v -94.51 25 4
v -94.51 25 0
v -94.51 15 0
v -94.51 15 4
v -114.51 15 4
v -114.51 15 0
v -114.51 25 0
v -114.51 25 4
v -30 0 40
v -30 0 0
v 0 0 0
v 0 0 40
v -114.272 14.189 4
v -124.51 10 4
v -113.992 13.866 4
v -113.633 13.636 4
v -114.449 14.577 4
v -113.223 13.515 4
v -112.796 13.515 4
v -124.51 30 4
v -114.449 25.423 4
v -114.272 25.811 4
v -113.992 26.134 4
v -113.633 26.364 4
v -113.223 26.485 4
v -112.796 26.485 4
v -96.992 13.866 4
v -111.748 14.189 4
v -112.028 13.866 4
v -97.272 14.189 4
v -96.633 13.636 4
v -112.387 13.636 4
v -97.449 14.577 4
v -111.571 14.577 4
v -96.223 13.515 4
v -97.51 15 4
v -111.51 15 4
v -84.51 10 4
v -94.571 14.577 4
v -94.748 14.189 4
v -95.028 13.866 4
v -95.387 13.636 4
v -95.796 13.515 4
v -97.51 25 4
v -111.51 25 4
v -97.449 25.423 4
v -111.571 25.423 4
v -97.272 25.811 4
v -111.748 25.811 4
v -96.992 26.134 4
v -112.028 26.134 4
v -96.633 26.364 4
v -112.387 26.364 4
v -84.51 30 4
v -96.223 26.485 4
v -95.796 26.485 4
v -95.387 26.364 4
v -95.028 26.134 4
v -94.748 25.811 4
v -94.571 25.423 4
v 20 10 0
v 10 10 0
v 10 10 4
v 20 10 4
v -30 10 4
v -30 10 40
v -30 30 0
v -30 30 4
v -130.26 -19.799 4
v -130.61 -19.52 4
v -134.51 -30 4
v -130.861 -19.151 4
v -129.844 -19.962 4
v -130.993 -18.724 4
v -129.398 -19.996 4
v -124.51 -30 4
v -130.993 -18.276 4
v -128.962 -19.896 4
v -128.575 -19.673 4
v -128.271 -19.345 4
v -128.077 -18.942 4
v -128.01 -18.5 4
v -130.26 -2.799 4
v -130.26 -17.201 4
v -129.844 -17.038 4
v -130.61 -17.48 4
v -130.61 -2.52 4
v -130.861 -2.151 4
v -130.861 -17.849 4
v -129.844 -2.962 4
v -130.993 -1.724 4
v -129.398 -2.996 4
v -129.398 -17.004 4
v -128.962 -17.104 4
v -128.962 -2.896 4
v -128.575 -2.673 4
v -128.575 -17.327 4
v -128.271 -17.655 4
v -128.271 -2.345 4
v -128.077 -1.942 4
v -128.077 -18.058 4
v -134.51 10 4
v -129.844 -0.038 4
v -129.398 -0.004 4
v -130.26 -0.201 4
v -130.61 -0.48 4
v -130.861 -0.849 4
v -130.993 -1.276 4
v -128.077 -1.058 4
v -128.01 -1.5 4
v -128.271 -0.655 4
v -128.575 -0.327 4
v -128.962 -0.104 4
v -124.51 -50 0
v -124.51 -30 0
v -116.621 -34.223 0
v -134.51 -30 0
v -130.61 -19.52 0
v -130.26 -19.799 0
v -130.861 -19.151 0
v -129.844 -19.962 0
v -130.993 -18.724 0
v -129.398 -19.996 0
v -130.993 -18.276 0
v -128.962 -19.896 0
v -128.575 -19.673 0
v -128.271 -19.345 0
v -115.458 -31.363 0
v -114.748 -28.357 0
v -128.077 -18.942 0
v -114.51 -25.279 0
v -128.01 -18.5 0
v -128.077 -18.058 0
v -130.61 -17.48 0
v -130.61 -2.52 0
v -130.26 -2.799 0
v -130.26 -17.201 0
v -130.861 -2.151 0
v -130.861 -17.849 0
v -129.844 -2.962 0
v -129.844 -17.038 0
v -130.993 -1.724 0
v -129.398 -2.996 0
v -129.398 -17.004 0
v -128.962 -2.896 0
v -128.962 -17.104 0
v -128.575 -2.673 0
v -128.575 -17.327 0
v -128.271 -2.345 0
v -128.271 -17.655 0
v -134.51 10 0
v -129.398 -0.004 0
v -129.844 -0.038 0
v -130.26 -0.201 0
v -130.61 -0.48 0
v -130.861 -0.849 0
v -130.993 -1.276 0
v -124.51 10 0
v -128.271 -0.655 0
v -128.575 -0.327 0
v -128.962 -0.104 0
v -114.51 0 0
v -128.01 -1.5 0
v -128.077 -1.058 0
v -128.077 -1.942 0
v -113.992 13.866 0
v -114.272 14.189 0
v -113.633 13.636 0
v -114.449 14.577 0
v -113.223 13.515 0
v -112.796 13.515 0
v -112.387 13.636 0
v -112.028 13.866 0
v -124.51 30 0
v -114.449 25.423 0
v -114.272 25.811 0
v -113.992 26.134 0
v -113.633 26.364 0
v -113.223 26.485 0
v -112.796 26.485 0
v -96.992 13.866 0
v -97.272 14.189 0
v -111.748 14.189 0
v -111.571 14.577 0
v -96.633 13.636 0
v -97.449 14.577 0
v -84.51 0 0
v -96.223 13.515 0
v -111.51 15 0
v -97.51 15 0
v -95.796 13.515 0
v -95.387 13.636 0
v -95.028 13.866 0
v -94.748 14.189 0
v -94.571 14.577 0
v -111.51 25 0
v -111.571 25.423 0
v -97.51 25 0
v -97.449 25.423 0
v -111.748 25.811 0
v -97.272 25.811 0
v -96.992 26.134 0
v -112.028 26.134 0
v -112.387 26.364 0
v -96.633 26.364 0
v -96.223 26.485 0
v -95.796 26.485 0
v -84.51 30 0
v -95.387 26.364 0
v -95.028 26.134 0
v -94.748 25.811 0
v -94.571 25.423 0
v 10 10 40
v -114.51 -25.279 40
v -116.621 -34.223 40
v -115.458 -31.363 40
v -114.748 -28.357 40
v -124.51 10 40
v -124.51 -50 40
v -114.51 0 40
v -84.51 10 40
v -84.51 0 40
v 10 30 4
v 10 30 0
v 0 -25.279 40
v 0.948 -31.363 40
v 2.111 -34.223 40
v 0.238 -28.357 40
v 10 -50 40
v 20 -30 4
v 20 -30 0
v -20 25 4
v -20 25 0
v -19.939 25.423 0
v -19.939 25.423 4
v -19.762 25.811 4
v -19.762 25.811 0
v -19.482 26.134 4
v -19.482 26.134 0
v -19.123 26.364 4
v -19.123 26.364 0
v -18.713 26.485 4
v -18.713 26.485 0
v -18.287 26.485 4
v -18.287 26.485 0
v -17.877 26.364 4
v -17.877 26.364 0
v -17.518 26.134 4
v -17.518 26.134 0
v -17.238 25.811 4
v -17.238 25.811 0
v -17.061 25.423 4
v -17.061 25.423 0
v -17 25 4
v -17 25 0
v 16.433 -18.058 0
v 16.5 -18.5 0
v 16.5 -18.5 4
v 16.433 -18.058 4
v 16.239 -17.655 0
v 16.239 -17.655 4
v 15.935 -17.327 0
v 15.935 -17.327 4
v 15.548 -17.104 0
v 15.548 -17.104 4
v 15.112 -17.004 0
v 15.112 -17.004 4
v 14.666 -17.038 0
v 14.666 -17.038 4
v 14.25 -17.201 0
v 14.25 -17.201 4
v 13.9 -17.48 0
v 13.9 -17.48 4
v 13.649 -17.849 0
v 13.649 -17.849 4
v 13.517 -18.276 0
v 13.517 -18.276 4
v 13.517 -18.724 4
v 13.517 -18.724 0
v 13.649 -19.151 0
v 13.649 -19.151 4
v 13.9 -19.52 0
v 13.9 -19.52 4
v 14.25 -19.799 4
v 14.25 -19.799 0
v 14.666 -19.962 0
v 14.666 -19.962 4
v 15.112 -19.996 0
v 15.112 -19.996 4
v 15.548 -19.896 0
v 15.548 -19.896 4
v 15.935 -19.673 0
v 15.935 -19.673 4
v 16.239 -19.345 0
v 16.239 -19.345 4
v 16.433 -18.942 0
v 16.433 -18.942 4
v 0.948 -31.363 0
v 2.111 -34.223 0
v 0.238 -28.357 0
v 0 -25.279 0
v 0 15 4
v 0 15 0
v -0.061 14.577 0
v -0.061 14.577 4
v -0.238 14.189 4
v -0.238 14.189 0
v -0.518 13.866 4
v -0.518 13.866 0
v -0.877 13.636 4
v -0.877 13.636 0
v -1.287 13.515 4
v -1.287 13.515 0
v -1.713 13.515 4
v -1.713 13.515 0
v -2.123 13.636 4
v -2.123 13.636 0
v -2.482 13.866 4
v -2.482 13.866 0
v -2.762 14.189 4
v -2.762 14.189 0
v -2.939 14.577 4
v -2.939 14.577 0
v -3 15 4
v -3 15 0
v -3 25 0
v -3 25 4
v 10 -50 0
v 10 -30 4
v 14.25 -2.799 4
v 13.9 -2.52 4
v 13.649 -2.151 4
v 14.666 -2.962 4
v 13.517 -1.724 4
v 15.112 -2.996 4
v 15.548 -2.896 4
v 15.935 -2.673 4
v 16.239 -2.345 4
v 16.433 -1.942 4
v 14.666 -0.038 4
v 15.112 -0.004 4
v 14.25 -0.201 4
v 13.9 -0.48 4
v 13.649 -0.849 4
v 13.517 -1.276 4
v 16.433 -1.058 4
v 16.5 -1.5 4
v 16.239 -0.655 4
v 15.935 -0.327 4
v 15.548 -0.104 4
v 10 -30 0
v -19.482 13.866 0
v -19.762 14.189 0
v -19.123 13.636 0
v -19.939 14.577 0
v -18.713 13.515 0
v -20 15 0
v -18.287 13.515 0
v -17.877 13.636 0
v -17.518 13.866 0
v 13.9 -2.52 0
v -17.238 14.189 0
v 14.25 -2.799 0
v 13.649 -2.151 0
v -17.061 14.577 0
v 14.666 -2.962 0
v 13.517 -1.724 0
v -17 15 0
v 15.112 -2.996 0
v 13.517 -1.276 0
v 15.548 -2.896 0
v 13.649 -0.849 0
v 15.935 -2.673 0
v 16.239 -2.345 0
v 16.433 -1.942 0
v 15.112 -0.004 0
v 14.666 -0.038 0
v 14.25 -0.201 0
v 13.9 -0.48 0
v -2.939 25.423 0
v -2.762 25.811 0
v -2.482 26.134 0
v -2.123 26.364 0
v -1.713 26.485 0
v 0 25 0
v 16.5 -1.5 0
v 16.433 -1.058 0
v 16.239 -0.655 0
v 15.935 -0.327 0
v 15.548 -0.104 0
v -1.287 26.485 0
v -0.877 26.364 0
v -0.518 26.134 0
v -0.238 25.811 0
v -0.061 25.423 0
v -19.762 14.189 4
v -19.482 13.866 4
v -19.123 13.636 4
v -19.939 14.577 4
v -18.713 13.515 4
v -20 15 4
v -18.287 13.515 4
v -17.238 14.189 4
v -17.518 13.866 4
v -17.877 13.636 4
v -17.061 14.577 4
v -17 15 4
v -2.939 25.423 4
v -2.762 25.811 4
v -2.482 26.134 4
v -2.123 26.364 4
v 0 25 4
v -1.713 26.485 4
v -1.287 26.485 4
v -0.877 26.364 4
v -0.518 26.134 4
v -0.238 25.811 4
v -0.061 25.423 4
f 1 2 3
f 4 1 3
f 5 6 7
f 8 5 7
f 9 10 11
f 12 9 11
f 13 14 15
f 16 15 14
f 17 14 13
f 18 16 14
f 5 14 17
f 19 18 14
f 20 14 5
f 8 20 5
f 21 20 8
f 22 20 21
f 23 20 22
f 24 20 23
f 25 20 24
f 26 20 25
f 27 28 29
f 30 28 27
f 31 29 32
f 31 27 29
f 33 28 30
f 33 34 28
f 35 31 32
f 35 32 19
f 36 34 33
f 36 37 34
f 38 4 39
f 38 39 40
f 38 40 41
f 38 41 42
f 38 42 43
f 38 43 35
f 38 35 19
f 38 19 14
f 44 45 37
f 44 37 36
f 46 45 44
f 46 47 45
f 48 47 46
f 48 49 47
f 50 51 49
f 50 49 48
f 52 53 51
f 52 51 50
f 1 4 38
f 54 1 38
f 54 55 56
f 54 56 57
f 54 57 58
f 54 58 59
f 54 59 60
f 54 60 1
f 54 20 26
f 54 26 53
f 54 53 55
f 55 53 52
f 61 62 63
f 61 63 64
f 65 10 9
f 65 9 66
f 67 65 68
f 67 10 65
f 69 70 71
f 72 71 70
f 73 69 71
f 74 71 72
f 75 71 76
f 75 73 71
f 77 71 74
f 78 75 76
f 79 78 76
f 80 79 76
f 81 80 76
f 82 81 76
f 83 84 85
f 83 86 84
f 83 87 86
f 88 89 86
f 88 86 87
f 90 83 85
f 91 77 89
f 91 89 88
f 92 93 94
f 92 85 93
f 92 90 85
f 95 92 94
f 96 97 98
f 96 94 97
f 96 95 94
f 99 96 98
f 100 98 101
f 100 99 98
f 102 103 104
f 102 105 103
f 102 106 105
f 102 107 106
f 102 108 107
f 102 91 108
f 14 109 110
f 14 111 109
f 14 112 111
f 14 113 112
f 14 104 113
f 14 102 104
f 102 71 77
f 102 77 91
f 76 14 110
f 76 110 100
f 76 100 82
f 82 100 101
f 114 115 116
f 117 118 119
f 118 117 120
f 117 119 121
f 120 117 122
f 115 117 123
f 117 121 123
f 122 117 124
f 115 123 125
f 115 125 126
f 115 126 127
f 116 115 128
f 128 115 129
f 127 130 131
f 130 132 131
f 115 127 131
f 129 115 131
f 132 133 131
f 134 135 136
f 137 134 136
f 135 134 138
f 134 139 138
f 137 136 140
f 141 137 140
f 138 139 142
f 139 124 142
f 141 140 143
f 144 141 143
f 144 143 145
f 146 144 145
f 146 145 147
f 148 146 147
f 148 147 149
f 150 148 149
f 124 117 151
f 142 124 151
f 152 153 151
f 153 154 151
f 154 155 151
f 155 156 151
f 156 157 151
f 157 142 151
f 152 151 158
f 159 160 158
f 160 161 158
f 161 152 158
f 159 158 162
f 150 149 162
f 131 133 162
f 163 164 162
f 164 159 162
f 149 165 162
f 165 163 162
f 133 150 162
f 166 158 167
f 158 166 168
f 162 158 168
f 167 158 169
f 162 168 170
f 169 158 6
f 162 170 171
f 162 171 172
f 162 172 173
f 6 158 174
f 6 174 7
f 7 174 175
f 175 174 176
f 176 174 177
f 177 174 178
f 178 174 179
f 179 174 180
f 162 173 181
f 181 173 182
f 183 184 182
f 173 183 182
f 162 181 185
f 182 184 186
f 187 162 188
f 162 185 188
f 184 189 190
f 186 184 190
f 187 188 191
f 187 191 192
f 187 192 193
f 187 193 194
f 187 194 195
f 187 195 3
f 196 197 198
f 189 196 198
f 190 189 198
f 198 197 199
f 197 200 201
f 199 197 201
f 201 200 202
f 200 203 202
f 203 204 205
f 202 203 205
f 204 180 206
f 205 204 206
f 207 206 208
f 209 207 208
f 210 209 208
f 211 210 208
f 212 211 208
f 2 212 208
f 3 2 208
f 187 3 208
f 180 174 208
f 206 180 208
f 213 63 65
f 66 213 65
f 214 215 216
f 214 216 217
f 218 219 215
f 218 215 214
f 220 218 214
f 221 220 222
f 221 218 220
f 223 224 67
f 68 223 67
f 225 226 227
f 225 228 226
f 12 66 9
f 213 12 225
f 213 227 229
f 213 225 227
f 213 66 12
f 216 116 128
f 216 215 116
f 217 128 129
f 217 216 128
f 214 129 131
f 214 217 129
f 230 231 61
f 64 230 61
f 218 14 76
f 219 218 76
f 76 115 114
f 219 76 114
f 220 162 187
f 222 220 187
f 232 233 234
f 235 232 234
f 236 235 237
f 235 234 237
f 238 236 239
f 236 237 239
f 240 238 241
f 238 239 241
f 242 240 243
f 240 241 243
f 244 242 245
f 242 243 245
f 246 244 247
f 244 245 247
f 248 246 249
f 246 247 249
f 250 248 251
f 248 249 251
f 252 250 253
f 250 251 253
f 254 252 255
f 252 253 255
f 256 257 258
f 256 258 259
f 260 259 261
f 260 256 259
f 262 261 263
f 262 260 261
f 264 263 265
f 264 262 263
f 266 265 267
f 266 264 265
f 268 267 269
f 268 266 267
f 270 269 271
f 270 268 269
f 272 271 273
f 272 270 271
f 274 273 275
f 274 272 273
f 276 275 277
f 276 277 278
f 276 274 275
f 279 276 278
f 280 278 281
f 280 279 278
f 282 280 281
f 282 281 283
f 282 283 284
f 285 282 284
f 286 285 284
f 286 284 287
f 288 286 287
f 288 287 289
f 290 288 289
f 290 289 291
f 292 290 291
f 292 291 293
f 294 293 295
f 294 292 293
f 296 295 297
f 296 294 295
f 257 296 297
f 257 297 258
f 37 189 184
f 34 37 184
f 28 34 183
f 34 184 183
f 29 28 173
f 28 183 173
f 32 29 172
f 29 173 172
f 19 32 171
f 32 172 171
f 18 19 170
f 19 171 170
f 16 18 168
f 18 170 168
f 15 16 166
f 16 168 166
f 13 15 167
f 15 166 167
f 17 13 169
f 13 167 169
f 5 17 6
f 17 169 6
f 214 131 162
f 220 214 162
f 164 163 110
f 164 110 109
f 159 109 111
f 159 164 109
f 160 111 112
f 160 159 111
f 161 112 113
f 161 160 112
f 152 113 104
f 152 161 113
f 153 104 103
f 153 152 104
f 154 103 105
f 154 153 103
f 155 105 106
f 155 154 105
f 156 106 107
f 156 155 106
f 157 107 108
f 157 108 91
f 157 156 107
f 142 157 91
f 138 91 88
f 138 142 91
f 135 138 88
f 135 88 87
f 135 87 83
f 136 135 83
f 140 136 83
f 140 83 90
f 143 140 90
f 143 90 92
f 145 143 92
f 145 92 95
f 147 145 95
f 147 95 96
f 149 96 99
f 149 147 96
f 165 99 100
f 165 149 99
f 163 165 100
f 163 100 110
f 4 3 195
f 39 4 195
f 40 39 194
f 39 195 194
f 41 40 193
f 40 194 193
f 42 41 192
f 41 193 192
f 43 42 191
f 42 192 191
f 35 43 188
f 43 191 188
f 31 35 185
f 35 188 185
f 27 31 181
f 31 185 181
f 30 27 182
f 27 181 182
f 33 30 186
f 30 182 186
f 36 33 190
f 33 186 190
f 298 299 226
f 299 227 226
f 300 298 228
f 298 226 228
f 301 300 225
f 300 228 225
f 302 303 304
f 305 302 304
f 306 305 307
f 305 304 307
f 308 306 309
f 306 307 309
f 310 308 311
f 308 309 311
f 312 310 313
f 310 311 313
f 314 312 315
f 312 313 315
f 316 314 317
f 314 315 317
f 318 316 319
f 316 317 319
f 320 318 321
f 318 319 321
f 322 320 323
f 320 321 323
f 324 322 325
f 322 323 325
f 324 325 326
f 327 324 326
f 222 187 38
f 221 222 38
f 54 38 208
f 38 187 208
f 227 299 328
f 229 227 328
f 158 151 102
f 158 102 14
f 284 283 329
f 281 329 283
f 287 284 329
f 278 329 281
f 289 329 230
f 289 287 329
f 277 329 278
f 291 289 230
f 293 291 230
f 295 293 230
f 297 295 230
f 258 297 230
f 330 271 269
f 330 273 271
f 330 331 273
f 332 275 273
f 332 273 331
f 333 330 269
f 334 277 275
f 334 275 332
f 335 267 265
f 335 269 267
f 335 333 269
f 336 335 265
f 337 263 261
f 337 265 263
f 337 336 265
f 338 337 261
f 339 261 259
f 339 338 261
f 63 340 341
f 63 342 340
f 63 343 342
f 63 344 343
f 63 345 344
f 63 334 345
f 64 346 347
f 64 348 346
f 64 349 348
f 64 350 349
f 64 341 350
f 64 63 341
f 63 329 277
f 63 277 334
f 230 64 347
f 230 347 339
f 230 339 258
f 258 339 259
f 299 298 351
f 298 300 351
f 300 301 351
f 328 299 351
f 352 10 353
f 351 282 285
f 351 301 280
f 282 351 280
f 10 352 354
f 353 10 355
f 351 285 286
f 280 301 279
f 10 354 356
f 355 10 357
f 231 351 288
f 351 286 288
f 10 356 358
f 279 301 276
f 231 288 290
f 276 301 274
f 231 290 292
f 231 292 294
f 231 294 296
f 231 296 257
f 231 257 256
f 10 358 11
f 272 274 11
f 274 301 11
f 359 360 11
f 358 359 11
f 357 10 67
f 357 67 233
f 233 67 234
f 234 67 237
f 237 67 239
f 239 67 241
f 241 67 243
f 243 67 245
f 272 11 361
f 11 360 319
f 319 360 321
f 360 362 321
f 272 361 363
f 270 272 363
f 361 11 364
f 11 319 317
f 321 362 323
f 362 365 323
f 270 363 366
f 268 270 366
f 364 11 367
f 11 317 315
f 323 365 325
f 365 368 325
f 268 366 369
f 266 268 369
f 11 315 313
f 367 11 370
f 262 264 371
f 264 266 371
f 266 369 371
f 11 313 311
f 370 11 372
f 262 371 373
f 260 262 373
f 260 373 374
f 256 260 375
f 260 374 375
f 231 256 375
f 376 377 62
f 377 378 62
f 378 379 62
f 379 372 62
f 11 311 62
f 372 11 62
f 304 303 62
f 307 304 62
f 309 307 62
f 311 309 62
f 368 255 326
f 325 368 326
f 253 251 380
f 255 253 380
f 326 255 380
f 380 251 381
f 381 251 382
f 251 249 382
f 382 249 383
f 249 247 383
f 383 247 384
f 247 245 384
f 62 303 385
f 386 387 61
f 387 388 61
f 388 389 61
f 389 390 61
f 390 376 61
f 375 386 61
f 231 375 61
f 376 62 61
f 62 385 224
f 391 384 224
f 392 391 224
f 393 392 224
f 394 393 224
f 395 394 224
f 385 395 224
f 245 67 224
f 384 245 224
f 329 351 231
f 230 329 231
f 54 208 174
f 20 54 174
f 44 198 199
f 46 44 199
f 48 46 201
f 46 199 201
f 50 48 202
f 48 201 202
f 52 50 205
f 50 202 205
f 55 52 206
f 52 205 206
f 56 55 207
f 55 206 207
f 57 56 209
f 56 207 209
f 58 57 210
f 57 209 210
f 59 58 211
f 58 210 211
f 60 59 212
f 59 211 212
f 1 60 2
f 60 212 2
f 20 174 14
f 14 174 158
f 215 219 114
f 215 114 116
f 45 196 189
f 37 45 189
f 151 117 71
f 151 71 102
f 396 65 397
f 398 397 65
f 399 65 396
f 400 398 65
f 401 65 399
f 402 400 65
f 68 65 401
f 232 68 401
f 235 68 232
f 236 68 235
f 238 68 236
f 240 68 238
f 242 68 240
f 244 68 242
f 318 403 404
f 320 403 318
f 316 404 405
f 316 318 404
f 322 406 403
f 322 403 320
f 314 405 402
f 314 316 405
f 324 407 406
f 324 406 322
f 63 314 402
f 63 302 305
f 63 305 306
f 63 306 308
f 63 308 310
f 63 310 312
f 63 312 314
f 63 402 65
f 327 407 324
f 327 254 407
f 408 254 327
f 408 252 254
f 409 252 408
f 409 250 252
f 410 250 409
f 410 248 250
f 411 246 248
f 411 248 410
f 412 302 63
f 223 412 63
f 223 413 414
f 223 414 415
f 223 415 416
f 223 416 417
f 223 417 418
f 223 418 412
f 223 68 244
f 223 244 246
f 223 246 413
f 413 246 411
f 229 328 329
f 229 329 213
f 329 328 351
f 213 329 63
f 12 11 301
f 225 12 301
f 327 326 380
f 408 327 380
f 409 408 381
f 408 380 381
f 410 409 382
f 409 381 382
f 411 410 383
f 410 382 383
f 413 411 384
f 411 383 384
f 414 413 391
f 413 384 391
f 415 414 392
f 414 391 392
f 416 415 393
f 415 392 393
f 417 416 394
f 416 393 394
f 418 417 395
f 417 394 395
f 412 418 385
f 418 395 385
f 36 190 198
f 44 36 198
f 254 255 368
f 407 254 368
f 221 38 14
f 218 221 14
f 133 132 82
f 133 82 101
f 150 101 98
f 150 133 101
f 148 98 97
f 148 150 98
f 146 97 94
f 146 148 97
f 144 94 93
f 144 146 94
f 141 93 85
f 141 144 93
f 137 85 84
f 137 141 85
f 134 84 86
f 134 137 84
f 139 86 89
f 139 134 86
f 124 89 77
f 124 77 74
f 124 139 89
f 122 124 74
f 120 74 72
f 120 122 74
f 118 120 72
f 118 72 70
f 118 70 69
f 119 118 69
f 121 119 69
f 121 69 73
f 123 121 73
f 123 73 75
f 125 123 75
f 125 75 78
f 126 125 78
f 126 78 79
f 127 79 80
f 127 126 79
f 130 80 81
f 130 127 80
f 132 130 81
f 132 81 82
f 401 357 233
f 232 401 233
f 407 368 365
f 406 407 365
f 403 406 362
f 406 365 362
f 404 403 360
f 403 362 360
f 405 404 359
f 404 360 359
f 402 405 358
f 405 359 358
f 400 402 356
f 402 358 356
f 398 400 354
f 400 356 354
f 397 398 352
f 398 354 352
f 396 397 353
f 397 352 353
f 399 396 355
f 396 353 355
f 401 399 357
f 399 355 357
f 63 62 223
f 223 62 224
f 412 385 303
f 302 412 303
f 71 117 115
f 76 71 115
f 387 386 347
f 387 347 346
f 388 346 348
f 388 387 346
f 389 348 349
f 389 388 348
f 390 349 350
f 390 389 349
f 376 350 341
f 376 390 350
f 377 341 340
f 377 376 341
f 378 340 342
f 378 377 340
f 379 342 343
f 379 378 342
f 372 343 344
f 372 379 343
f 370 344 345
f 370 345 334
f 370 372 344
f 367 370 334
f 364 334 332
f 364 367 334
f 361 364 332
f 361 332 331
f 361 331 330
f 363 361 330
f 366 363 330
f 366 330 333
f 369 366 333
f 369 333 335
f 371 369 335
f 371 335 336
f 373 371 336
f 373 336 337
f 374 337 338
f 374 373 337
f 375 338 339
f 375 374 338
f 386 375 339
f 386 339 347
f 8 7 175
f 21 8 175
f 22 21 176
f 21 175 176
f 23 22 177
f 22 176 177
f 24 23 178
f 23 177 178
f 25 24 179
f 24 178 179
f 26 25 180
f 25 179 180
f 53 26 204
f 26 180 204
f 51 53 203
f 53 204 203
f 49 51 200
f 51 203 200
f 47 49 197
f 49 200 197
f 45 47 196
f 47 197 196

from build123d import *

# Parameters (mm, degrees)
F1_DEPTH = 4
F0_W     = 10
F0_H     = 40
F0_R     = 1.5
F0_W_2   = 30
F0_H_2   = 10
F2_DEPTH = 40
F3_R     = 20
F3_2_R   = 20


# Not quite as in the source:
# - a feature names something its author has since deleted; it is built from what else it names


with BuildPart() as f1:
    # F0 (on Top) → F1 (new body)
    with BuildSketch(Plane.XY):
        Polygon((-30, 30), (-30, 10), (0, 10), (10, 10), (10, 30), align=None)
        with BuildLine():
            Line((-20, 15), (-20, 25))
            ThreePointArc((-20, 25), (-18.5, 26.5), (-17, 25))
            Line((-17, 25), (-17, 15))
            ThreePointArc((-17, 15), (-18.5, 13.5), (-20, 15))
        make_face(mode=Mode.SUBTRACT)
        with BuildLine():
            Line((-3, 15), (-3, 25))
            ThreePointArc((-3, 25), (-1.5, 26.5), (0, 25))
            Line((0, 25), (0, 15))
            ThreePointArc((0, 15), (-1.5, 13.5), (-3, 15))
        make_face(mode=Mode.SUBTRACT)
    extrude(amount=F1_DEPTH)



with BuildPart() as f1b:
    # F0 (on Top) → F1, piece 2 (new body)
    with BuildSketch(Plane.XY):
        with Locations((15, -10)):
            Rectangle(F0_W, F0_H)
        with Locations((15, -18.5)):
            Circle(F0_R, mode=Mode.SUBTRACT)
        with Locations((15, -1.5)):
            Circle(F0_R, mode=Mode.SUBTRACT)
    extrude(amount=F1_DEPTH)


with BuildPart() as f1c:
    # F0 (on Top) → F1, piece 3 (new body)
    with BuildSketch(Plane.XY):
        Polygon((-84.5099326968, 30), (-124.5099326968, 30), (-124.5099326968, 10), (-114.5099326968, 10), (-84.5099326968, 10), align=None)
        with BuildLine():
            Line((-111.5099326968, 25), (-111.5099326968, 15))
            ThreePointArc((-111.5099326968, 15), (-113.0099326968, 13.5), (-114.5099326968, 15))
            Line((-114.5099326968, 15), (-114.5099326968, 25))
            ThreePointArc((-114.5099326968, 25), (-113.0099326968, 26.5), (-111.5099326968, 25))
        make_face(mode=Mode.SUBTRACT)
        with BuildLine():
            Line((-97.5099326968, 15), (-97.5099326968, 25))
            ThreePointArc((-97.5099326968, 25), (-96.0099326968, 26.5), (-94.5099326968, 25))
            Line((-94.5099326968, 25), (-94.5099326968, 15))
            ThreePointArc((-94.5099326968, 15), (-96.0099326968, 13.5), (-97.5099326968, 15))
        make_face(mode=Mode.SUBTRACT)
    extrude(amount=F1_DEPTH)



with BuildPart() as f1d:
    # F0 (on Top) → F1, piece 4 (new body)
    with BuildSketch(Plane.XY):
        with Locations((-129.5099326968, -10)):
            Rectangle(F0_W, F0_H)
        with Locations((-129.5099326968, -18.5)):
            Circle(F0_R, mode=Mode.SUBTRACT)
        with Locations((-129.5099326968, -1.5)):
            Circle(F0_R, mode=Mode.SUBTRACT)
    extrude(amount=F1_DEPTH)


with BuildPart() as f1_1:
    add(f1.part)

    add(f1b.part)  # F2 merges F1b
    # F0 (on Top) → F2 (join)
    with BuildSketch(Plane.XY):
        with Locations((-15, 5)):
            Rectangle(F0_W_2, F0_H_2)
        Polygon((10, 10), (0, 10), (0, 0), (0, -30), (10, -30), align=None)
        Polygon((10, -30), (0, -30), (10, -50), align=None)
    extrude(amount=F2_DEPTH)

    # F3
    f3_edges = [f1_1.edges().sort_by_distance(p)[0] for p in [
        (0, -30, 20),
    ]]
    fillet(f3_edges, radius=F3_R)


with BuildPart() as f1c_1:
    add(f1c.part)

    add(f1d.part)  # F2#2 merges F1d
    # F0 (on Top) → F2, piece 2 (join)
    with BuildSketch(Plane.XY):
        with Locations((-99.5099326968, 5)):
            Rectangle(F0_W_2, F0_H_2)
        Polygon((-114.5099326968, 10), (-124.5099326968, 10), (-124.5099326968, -30), (-114.5099326968, -30), (-114.5099326968, 0), align=None)
        Polygon((-114.5099326968, -30), (-124.5099326968, -30), (-124.5099326968, -50), align=None)
    extrude(amount=F2_DEPTH)

    # F3#2
    f3_2_edges = [f1c_1.edges().sort_by_distance(p)[0] for p in [
        (-114.509933, -30, 20),
    ]]
    fillet(f3_2_edges, radius=F3_2_R)


solid = Compound([f1_1.part, f1c_1.part])
